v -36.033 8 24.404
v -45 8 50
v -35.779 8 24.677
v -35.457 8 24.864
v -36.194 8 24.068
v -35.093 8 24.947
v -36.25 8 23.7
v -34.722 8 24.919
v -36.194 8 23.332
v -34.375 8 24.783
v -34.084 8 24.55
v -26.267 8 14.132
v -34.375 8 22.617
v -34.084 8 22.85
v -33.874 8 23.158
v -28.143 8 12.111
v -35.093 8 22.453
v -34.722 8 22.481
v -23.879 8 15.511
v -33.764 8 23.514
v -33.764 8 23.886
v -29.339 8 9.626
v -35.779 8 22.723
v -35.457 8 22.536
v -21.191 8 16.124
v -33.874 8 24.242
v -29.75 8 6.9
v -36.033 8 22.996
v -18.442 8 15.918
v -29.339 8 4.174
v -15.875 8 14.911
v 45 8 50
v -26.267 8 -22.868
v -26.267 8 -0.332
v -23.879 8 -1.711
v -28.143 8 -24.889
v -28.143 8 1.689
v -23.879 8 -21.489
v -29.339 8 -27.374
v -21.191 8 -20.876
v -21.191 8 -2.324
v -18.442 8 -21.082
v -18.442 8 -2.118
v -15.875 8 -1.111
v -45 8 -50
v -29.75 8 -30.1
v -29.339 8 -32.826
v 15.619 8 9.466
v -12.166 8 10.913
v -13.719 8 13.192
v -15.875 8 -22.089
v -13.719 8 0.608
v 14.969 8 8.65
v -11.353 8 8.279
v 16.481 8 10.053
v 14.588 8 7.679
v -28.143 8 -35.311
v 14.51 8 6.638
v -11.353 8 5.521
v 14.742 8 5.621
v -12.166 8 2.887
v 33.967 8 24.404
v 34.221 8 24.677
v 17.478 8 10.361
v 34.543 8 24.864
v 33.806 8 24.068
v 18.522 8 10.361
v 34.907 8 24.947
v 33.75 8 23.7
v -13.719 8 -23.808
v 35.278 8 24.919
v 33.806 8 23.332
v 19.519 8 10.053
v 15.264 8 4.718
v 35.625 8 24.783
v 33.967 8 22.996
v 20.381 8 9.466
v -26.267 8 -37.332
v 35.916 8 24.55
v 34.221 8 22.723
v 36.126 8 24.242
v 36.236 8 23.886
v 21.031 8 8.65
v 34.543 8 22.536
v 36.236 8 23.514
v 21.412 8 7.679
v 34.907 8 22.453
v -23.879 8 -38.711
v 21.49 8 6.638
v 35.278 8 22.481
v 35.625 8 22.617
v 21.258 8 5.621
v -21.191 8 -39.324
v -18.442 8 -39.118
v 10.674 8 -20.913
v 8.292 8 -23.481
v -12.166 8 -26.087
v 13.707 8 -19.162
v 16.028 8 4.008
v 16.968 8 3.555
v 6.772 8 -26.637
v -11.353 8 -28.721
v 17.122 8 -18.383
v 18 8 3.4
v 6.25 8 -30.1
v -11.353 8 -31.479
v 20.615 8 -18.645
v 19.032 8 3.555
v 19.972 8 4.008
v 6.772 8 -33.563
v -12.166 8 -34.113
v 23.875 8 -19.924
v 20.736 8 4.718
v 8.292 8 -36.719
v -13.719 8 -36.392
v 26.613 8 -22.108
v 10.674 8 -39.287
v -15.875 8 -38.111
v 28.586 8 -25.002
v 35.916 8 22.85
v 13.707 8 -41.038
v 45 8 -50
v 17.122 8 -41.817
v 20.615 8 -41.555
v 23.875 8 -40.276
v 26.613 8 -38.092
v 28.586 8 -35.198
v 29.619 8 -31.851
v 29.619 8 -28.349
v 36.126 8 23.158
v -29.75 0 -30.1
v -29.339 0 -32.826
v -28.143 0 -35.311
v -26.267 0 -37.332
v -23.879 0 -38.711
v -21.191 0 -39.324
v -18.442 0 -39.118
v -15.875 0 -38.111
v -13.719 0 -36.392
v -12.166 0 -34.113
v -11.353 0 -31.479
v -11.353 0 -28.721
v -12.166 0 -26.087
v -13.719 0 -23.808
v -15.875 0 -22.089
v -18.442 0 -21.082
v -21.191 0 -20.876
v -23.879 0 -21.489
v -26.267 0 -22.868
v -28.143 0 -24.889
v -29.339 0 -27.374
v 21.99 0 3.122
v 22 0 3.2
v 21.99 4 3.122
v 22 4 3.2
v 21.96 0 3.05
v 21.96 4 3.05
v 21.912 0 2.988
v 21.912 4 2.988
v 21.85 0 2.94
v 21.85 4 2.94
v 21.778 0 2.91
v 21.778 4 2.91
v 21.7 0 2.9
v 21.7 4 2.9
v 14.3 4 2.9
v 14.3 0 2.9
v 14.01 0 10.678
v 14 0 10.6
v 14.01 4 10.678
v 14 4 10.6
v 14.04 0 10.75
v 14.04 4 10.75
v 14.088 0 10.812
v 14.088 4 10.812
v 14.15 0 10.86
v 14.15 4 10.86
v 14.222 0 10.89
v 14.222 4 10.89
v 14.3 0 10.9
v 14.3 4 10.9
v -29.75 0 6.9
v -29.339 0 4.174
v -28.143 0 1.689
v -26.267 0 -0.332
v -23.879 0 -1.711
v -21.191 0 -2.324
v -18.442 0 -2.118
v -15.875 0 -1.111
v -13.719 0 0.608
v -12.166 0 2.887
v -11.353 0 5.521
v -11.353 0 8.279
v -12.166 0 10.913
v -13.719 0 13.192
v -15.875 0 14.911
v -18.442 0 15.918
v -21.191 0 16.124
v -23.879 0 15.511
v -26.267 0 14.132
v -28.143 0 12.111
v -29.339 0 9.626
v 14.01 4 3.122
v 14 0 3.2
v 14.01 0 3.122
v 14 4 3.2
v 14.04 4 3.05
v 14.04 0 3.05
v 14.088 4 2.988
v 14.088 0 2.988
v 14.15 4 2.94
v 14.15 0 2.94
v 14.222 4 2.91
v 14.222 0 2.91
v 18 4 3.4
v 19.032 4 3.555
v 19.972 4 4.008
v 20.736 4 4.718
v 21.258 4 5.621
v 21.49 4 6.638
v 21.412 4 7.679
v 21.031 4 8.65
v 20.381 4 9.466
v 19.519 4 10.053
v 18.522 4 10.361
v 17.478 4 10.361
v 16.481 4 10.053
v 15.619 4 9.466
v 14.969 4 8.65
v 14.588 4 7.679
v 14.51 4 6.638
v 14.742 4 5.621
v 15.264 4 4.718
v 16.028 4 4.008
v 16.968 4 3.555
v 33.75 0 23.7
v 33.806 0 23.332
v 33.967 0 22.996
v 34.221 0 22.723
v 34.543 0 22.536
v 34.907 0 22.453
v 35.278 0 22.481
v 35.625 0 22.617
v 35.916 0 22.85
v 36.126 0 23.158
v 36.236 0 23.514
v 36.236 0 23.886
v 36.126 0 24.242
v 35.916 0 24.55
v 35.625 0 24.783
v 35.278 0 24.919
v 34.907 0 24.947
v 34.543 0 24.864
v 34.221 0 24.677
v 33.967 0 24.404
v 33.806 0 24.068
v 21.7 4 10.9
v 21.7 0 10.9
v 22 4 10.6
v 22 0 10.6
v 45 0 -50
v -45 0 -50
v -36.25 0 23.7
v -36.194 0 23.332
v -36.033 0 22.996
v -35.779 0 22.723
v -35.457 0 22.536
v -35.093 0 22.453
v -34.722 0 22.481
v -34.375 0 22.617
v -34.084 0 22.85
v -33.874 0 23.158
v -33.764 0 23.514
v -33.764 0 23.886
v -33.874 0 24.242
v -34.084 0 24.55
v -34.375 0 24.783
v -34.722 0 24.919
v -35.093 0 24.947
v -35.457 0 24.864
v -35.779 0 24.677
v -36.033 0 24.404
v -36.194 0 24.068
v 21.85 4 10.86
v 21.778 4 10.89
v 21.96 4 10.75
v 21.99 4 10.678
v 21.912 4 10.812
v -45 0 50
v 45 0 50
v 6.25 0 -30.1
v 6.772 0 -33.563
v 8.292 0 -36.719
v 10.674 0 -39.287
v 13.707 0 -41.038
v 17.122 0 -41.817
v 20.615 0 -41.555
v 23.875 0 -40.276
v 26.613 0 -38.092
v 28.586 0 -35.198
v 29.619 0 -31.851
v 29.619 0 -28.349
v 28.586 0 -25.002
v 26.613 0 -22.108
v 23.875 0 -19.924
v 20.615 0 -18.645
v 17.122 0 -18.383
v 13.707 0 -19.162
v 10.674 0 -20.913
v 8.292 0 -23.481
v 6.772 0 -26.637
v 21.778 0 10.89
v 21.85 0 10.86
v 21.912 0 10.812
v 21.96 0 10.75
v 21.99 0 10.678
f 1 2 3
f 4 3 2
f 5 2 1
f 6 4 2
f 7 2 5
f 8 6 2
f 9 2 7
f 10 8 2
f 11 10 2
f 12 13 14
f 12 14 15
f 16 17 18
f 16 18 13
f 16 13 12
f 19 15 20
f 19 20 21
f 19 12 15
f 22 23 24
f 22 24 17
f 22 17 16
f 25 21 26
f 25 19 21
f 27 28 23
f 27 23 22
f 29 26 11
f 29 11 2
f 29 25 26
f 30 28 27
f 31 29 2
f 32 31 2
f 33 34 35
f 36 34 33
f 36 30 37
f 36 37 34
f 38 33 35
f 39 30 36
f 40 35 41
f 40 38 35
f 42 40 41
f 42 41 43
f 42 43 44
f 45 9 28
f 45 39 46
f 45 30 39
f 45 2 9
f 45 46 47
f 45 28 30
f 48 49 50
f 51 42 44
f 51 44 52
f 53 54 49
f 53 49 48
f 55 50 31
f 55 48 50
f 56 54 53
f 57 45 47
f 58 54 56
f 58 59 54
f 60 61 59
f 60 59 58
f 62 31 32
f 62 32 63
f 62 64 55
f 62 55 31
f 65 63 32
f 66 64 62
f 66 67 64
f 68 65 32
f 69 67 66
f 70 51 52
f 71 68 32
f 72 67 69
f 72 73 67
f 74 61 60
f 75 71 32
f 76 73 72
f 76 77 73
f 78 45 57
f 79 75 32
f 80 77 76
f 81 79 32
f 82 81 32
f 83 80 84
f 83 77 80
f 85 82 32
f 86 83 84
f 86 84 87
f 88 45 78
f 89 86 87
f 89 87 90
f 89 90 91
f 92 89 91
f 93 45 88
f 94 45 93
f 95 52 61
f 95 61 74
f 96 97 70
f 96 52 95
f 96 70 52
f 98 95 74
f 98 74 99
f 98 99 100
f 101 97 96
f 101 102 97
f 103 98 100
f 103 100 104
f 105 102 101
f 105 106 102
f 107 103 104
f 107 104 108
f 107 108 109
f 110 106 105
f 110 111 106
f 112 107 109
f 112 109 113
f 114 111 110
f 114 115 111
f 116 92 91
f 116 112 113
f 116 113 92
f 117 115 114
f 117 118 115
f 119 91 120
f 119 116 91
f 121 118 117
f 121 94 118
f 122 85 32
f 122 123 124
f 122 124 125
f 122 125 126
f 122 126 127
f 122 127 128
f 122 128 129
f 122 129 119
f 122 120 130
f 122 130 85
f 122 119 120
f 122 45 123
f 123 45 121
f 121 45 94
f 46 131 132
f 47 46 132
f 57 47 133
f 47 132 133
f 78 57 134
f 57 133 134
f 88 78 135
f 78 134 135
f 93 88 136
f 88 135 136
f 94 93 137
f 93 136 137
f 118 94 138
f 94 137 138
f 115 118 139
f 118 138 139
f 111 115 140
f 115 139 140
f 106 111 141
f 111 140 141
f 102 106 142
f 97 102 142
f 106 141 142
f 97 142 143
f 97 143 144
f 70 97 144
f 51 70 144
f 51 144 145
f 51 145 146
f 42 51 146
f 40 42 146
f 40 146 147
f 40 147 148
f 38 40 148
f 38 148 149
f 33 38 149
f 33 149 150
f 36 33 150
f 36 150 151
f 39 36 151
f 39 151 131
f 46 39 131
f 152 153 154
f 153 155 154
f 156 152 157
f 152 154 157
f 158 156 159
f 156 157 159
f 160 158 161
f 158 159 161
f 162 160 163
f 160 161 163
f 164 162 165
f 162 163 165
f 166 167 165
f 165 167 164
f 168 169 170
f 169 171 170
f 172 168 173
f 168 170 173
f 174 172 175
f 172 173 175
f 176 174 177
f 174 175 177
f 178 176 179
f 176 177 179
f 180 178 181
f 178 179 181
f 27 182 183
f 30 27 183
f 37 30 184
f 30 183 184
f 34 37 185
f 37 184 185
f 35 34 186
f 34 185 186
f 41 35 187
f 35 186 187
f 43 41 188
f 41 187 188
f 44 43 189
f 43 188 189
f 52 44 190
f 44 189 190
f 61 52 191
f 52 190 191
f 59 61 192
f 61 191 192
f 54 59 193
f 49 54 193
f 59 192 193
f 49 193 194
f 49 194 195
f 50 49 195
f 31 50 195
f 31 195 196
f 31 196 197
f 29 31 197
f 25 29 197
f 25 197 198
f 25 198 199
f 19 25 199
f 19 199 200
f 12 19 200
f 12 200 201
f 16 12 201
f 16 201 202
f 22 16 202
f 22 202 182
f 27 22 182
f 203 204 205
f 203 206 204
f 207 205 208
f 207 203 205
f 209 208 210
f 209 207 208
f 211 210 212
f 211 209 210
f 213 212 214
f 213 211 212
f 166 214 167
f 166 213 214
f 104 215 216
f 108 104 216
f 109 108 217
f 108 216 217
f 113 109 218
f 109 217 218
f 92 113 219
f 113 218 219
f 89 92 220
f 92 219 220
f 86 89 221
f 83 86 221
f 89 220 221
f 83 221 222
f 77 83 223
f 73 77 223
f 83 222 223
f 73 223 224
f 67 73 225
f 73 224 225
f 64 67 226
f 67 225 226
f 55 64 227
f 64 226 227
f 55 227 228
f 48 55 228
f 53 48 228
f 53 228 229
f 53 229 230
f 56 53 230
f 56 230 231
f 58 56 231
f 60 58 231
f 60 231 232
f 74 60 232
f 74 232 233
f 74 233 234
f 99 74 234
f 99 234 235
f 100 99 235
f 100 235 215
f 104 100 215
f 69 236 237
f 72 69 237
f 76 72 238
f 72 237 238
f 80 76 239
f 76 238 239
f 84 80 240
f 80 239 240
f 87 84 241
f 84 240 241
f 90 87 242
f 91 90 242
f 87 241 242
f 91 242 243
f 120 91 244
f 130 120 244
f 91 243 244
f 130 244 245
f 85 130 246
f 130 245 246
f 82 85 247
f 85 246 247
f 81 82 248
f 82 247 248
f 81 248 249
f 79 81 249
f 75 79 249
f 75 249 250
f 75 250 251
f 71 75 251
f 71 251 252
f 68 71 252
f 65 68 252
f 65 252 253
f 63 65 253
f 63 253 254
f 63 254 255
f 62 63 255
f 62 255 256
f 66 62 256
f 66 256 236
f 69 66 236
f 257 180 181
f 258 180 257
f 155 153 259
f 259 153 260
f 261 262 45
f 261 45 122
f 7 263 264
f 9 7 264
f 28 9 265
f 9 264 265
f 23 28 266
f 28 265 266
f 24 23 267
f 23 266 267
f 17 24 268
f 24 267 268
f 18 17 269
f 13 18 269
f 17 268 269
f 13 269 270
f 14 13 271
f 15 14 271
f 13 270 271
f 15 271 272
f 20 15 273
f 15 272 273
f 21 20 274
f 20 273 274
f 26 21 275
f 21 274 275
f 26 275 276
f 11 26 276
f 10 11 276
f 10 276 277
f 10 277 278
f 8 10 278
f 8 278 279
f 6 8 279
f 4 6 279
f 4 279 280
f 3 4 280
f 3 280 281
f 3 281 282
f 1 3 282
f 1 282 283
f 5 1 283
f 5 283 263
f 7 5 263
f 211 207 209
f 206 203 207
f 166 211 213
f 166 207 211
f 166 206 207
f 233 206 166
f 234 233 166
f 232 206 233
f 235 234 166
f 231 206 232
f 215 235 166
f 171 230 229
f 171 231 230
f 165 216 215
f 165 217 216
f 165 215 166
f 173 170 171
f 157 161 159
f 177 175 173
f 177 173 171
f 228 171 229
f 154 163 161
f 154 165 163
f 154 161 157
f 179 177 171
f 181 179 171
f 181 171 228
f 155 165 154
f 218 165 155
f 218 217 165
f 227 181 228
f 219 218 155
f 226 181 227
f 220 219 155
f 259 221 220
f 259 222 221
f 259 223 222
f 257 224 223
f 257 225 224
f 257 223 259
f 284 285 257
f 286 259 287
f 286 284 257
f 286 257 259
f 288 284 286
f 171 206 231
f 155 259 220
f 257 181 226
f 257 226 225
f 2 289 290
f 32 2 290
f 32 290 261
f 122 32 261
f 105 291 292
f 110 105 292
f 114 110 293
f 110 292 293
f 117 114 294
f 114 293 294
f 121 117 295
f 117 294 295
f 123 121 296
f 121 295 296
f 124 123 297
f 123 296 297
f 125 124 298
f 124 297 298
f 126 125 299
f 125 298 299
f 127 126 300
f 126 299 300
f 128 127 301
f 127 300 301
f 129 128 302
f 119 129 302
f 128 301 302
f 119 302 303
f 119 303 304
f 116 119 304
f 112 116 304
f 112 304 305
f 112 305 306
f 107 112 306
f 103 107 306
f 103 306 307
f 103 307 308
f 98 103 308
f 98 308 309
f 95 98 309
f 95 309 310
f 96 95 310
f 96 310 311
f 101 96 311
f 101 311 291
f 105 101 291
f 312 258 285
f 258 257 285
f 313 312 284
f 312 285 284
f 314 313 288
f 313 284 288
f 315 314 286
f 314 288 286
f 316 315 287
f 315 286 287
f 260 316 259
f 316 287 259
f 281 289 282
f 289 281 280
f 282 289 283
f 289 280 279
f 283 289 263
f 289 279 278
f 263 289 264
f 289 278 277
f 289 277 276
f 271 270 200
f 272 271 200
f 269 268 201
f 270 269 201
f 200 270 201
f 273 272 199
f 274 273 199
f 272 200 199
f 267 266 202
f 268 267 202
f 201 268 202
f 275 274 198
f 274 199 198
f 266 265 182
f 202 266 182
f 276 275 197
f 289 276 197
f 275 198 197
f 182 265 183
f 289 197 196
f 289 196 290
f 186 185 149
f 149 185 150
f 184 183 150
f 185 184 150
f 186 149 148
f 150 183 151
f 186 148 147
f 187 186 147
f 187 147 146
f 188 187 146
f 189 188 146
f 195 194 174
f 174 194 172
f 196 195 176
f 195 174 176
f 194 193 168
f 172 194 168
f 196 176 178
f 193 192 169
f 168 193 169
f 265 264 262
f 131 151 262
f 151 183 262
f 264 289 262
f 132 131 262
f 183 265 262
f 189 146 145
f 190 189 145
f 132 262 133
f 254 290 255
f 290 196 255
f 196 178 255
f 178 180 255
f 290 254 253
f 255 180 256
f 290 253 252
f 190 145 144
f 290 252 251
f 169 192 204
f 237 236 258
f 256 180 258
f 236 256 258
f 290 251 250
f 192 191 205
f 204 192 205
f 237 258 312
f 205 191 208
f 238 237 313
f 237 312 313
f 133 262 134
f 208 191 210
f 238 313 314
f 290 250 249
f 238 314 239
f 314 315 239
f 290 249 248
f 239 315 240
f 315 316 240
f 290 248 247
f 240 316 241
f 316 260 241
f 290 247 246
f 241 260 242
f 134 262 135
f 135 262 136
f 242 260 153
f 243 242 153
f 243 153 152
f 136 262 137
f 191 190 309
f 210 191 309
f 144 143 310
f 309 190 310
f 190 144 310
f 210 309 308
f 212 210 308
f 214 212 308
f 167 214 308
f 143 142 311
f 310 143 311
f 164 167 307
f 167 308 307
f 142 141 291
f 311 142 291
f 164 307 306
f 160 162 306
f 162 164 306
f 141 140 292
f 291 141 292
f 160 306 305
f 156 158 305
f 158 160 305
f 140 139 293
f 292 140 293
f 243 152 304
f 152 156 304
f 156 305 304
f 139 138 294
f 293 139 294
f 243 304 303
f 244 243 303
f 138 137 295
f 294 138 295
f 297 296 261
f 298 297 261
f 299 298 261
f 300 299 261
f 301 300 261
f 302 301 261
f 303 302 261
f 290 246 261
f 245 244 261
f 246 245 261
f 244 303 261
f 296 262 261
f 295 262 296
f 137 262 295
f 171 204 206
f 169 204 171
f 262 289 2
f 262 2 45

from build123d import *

# Parameters (mm, degrees)
SKETCH_1_W            = 90
SKETCH_1_H            = 100
EXTRUDE_1_DEPTH       = 8
M20X1_51_D            = 18.5
M25X1_51_D            = 23.5
SKETCH_6_W            = 8
SKETCH_6_H            = 8
CUT_EXTRUDE_1_DEPTH   = 4
FILLET_1_R            = 0.3
SKETCH_7_R            = 3.5
CUT_EXTRUDE_2_DEPTH   = 9
HOLE_WIZARD_M31_D     = 2.5
HOLE_WIZARD_M31_DEPTH = 8.5
HOLE_WIZARD_M31_TIP   = 0.751075774


with BuildPart() as part:
    # Эскиз1 → Бобышка-Вытянуть1 (new body)
    with BuildSketch(Plane(origin=(0, 0, 0), x_dir=(1, 0, 0), z_dir=(0, 1, 0))):
        Rectangle(SKETCH_1_W, SKETCH_1_H)
    extrude(amount=EXTRUDE_1_DEPTH)

    # Отверстие обработанное метчиком M20x1,51 (through all)
    with Locations(Plane(origin=(0, 8, 0), x_dir=(1, 0, 0), z_dir=(0, 1, 0))):
        with Locations((-20.5, 30.1), (18, 30.1), (-20.5, -6.9)):
            Hole(M20X1_51_D / 2)

    # Отверстие обработанное метчиком M25x1,51 (through all)
    with Locations(Plane(origin=(0, 8, 0), x_dir=(1, 0, 0), z_dir=(0, 1, 0))):
        with Locations((18, 30.1)):
            Hole(M25X1_51_D / 2)

    # Эскиз6 → Вырез-Вытянуть1 (cut)
    with BuildSketch(Plane.XZ):
        with Locations((18, 6.9)):
            Rectangle(SKETCH_6_W, SKETCH_6_H)
    extrude(amount=-CUT_EXTRUDE_1_DEPTH, mode=Mode.SUBTRACT)

    # Скругление1
    fillet_1_edges = [part.edges().sort_by_distance(p)[0] for p in [
        (14, 2, 2.9),
        (14, 2, 10.9),
        (22, 2, 10.9),
        (22, 2, 2.9),
    ]]
    fillet(fillet_1_edges, radius=FILLET_1_R)

    # Эскиз7 → Вырез-Вытянуть2 (cut)
    with BuildSketch(Plane.XZ.offset(-4)):
        with Locations(Location((18, 6.9, 0), (0, 0, 270))):
            Circle(SKETCH_7_R)
    extrude(amount=-CUT_EXTRUDE_2_DEPTH, mode=Mode.SUBTRACT)

    # Отверстие обработанное метчиком M31
    with Locations(Plane(origin=(0, 8, 0), x_dir=(1, 0, 0), z_dir=(0, 1, 0))):
        with Locations((35, -23.7), (-35, -23.7)):
            Hole(HOLE_WIZARD_M31_D / 2, depth=HOLE_WIZARD_M31_DEPTH)
            with Locations((0, 0, -(HOLE_WIZARD_M31_DEPTH + HOLE_WIZARD_M31_TIP / 2))):  # 118° drill point
                Cone(0, HOLE_WIZARD_M31_D / 2, HOLE_WIZARD_M31_TIP, mode=Mode.SUBTRACT)


solid = part.part
